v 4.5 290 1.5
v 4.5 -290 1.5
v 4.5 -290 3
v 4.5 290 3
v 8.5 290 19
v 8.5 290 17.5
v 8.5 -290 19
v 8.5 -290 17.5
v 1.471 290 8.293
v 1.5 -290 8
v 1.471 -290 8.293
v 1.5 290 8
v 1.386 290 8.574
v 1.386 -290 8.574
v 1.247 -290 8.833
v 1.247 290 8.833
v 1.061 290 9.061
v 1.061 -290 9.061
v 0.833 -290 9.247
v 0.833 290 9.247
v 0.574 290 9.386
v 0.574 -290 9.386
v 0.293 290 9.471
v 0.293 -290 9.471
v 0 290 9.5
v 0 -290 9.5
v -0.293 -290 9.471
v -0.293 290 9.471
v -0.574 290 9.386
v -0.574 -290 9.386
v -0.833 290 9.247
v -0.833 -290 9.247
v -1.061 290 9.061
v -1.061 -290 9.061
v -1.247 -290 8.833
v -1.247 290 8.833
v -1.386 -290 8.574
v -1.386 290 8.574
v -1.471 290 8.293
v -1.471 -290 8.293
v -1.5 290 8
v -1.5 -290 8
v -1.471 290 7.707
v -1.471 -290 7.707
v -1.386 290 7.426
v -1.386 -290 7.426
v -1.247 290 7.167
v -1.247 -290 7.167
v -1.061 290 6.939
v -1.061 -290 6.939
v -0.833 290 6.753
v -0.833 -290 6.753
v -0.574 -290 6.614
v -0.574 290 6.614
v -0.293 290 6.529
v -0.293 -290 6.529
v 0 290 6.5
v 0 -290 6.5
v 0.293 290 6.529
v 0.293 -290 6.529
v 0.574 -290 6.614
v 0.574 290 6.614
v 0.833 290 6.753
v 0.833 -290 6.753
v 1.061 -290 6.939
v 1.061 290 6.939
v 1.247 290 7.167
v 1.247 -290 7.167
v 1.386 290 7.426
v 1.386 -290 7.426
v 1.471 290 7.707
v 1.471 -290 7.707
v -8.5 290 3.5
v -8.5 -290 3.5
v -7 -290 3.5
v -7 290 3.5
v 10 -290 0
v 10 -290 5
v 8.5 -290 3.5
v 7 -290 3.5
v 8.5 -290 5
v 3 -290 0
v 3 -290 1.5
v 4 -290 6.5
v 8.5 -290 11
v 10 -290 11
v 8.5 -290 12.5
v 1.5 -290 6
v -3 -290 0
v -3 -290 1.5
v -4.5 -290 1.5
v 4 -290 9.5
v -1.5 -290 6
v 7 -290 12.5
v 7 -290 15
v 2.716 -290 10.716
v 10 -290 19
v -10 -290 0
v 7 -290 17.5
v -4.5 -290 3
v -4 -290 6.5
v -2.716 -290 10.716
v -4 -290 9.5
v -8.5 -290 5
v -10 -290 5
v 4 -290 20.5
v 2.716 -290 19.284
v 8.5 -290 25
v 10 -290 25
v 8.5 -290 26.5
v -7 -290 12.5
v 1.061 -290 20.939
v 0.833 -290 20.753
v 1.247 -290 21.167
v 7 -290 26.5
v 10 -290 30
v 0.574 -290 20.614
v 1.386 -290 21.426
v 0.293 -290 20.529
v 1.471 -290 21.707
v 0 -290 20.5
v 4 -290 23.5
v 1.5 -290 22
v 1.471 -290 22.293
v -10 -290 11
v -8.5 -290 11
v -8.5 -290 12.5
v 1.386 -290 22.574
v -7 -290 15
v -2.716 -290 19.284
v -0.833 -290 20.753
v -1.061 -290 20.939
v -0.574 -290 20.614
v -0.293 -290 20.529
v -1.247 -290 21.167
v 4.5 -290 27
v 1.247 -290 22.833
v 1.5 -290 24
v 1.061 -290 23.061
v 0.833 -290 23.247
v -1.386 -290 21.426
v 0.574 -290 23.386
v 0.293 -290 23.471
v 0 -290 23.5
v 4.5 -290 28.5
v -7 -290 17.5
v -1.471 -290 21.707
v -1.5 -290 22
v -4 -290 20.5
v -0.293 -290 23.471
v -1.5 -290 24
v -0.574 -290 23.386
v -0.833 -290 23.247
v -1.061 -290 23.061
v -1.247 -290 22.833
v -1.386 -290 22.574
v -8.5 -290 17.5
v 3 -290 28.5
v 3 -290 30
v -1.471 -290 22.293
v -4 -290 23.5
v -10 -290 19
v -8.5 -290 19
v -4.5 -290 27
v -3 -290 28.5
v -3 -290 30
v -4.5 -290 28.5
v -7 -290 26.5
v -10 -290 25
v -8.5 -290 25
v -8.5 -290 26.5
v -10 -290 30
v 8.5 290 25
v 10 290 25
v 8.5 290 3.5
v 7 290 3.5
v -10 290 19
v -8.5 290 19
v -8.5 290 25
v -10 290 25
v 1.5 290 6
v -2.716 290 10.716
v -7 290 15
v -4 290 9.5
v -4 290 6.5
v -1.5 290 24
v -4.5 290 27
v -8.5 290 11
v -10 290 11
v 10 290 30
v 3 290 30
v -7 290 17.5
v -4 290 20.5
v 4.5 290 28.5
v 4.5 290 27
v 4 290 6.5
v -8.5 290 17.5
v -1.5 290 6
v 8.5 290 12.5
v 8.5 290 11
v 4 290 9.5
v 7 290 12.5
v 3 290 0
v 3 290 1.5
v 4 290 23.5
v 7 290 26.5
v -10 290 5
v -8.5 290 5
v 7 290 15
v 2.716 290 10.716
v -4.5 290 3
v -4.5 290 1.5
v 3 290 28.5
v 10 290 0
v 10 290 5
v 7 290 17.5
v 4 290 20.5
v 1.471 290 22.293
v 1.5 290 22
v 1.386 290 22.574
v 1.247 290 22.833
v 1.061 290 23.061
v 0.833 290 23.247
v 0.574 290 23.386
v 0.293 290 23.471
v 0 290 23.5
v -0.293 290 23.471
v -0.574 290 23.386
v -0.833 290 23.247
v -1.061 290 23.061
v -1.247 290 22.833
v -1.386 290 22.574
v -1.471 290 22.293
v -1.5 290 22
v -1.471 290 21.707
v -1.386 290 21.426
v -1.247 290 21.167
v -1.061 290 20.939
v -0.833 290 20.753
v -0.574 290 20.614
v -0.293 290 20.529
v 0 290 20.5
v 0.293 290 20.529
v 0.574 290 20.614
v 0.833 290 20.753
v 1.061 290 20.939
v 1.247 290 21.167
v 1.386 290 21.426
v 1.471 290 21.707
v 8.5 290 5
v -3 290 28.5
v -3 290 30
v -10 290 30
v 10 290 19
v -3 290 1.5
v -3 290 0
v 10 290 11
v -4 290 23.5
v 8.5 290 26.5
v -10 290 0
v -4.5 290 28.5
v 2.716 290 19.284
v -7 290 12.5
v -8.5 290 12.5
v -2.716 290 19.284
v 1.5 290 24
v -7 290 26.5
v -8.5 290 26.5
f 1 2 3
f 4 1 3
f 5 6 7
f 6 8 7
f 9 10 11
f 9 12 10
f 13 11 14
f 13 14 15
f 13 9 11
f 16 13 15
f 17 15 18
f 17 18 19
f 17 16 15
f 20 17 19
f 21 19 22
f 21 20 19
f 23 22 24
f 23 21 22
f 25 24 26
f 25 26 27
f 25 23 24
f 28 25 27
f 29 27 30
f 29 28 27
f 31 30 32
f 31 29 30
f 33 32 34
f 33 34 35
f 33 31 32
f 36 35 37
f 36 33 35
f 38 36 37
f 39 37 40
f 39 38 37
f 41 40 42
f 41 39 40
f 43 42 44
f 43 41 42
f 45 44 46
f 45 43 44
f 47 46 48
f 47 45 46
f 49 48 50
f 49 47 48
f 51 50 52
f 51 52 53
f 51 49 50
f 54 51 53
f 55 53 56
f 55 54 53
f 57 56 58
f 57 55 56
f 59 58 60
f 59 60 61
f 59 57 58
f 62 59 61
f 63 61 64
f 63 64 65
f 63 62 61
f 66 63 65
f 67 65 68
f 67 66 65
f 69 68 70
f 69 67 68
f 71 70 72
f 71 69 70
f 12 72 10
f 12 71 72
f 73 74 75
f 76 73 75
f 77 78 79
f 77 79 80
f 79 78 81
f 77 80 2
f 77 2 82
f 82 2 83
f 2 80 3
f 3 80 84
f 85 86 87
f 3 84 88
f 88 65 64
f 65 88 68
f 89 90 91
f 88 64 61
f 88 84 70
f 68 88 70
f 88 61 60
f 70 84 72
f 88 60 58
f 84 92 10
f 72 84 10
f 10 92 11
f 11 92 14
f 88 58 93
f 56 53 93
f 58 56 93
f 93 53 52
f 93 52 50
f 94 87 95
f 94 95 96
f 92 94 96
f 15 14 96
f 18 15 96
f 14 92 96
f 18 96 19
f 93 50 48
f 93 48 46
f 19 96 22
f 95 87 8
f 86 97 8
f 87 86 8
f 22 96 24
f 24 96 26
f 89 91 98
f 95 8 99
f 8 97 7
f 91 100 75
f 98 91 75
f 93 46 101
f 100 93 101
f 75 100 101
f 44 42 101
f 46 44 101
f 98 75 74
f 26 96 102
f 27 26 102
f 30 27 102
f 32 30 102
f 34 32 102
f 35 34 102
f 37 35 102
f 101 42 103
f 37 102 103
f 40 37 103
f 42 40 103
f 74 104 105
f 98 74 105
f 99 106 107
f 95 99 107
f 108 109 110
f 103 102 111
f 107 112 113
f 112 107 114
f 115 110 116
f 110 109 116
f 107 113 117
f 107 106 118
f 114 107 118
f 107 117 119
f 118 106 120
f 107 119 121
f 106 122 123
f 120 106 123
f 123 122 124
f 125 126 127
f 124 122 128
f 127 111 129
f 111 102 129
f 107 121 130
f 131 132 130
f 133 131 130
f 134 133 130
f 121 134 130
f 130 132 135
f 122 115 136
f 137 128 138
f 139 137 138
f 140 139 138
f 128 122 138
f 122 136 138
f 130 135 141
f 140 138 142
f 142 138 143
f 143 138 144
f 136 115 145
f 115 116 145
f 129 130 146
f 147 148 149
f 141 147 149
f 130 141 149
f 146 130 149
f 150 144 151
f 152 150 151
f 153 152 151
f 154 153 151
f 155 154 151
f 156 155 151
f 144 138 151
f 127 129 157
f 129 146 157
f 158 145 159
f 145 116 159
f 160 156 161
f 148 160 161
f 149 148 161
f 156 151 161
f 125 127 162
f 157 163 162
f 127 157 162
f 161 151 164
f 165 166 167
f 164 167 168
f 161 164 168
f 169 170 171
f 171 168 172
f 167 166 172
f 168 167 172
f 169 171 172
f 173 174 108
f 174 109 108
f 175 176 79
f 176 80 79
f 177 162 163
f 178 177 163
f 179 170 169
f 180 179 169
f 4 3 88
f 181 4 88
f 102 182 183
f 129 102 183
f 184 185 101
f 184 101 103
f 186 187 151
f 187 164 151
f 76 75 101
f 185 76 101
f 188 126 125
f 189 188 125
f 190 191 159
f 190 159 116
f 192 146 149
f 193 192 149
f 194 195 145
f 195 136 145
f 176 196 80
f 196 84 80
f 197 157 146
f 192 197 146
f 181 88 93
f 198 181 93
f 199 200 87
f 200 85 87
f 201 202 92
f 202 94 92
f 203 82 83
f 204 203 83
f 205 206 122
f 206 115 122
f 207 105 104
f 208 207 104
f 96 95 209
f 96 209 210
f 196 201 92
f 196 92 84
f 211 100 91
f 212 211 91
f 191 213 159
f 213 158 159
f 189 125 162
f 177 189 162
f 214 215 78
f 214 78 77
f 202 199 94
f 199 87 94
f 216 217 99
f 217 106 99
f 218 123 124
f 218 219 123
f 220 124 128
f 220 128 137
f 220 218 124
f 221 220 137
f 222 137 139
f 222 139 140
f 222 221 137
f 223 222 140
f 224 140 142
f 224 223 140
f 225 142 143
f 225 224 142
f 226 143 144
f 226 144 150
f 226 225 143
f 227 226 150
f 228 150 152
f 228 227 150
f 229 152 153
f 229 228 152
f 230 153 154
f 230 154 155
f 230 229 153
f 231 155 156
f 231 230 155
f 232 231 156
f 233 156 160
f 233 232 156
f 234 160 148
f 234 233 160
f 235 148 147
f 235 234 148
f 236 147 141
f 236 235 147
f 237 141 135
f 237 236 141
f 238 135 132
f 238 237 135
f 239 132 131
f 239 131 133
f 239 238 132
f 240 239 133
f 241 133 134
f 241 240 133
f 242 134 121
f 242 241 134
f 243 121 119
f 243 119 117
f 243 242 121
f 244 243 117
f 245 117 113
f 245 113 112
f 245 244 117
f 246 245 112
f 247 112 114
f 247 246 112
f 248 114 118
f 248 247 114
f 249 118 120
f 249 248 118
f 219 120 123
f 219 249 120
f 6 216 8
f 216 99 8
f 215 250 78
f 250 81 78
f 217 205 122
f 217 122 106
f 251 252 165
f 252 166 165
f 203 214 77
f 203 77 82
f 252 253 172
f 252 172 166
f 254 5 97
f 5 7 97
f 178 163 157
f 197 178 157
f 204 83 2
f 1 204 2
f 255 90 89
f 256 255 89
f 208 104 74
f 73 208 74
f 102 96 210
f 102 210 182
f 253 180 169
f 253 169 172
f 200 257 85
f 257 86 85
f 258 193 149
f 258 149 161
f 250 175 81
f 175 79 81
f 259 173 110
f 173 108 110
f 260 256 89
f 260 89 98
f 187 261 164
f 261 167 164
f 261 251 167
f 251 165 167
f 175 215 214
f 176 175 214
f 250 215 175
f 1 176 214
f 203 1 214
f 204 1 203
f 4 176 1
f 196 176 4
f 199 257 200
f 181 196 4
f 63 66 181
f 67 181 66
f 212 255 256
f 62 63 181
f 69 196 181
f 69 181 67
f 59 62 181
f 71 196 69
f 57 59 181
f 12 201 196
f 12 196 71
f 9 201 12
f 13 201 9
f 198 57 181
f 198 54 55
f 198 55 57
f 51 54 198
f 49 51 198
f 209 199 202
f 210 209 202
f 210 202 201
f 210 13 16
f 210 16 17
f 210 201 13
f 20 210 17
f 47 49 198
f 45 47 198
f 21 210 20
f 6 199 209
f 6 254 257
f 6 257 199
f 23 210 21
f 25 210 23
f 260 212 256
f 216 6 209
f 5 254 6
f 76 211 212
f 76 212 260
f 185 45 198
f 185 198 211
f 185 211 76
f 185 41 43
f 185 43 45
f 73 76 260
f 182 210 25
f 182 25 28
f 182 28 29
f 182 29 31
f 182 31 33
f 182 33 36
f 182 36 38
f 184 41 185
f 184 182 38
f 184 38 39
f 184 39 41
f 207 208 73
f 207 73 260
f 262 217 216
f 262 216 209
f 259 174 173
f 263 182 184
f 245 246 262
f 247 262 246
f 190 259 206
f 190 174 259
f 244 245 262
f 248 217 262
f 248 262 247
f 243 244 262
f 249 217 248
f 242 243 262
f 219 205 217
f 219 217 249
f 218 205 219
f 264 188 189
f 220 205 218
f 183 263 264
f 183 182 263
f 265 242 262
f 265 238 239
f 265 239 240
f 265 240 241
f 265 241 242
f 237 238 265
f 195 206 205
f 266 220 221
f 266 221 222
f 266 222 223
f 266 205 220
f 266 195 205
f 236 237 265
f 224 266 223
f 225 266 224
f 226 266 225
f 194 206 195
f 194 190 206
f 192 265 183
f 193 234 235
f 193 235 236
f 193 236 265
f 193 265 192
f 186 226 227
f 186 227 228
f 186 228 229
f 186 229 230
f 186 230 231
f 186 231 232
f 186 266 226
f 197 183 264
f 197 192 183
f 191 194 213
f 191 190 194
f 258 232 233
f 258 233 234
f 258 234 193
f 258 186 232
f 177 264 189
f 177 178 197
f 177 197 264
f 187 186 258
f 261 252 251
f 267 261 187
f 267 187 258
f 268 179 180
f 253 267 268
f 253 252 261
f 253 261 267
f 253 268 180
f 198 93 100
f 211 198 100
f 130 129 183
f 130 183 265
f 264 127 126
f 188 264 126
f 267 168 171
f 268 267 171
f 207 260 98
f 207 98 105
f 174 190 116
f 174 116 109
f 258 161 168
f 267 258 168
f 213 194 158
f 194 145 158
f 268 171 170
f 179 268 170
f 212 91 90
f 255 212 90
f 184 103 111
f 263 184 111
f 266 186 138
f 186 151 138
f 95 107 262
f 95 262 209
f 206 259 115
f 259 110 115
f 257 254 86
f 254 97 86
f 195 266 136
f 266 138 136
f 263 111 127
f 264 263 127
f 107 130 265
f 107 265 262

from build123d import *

# Parameters (mm, degrees)
SKETCH_R  = 1.5
PAD_DEPTH = 290


with BuildPart() as part:
    # Sketch → Pad (new body, symmetric)
    with BuildSketch(Plane.XZ):
        Polygon((-10, 30), (-3, 30), (-3, 28.5), (-4.5, 28.5), (-4.5, 27), (-1.5, 24), (1.5, 24), (4.5, 27), (4.5, 28.5), (3, 28.5), (3, 30), (10, 30), (10, 25), (8.5, 25), (8.5, 26.5), (7, 26.5), (4, 23.5), (4, 20.5), (7, 17.5), (8.5, 17.5), (8.5, 19), (10, 19), (10, 11), (8.5, 11), (8.5, 12.5), (7, 12.5), (4, 9.5), (4, 6.5), (7, 3.5), (8.5, 3.5), (8.5, 5), (10, 5), (10, 0), (3, 0), (3, 1.5), (4.5, 1.5), (4.5, 3), (1.5, 6), (-1.5, 6), (-4.5, 3), (-4.5, 1.5), (-3, 1.5), (-3, 0), (-10, 0), (-10, 5), (-8.5, 5), (-8.5, 3.5), (-7, 3.5), (-4, 6.5), (-4, 9.5), (-7, 12.5), (-8.5, 12.5), (-8.5, 11), (-10, 11), (-10, 19), (-8.5, 19), (-8.5, 17.5), (-7, 17.5), (-4, 20.5), (-4, 23.5), (-7, 26.5), (-8.5, 26.5), (-8.5, 25), (-10, 25), align=None)
        with Locations((0, 8)):
            Circle(SKETCH_R, mode=Mode.SUBTRACT)
        with Locations((0, 22)):
            Circle(SKETCH_R, mode=Mode.SUBTRACT)
        Polygon((-7, 15), (-2.716354, 19.283646), (2.716354, 19.283646), (7, 15), (2.716354, 10.716354), (-2.716354, 10.716354), align=None, mode=Mode.SUBTRACT)
    extrude(amount=PAD_DEPTH, both=True)


solid = part.part
